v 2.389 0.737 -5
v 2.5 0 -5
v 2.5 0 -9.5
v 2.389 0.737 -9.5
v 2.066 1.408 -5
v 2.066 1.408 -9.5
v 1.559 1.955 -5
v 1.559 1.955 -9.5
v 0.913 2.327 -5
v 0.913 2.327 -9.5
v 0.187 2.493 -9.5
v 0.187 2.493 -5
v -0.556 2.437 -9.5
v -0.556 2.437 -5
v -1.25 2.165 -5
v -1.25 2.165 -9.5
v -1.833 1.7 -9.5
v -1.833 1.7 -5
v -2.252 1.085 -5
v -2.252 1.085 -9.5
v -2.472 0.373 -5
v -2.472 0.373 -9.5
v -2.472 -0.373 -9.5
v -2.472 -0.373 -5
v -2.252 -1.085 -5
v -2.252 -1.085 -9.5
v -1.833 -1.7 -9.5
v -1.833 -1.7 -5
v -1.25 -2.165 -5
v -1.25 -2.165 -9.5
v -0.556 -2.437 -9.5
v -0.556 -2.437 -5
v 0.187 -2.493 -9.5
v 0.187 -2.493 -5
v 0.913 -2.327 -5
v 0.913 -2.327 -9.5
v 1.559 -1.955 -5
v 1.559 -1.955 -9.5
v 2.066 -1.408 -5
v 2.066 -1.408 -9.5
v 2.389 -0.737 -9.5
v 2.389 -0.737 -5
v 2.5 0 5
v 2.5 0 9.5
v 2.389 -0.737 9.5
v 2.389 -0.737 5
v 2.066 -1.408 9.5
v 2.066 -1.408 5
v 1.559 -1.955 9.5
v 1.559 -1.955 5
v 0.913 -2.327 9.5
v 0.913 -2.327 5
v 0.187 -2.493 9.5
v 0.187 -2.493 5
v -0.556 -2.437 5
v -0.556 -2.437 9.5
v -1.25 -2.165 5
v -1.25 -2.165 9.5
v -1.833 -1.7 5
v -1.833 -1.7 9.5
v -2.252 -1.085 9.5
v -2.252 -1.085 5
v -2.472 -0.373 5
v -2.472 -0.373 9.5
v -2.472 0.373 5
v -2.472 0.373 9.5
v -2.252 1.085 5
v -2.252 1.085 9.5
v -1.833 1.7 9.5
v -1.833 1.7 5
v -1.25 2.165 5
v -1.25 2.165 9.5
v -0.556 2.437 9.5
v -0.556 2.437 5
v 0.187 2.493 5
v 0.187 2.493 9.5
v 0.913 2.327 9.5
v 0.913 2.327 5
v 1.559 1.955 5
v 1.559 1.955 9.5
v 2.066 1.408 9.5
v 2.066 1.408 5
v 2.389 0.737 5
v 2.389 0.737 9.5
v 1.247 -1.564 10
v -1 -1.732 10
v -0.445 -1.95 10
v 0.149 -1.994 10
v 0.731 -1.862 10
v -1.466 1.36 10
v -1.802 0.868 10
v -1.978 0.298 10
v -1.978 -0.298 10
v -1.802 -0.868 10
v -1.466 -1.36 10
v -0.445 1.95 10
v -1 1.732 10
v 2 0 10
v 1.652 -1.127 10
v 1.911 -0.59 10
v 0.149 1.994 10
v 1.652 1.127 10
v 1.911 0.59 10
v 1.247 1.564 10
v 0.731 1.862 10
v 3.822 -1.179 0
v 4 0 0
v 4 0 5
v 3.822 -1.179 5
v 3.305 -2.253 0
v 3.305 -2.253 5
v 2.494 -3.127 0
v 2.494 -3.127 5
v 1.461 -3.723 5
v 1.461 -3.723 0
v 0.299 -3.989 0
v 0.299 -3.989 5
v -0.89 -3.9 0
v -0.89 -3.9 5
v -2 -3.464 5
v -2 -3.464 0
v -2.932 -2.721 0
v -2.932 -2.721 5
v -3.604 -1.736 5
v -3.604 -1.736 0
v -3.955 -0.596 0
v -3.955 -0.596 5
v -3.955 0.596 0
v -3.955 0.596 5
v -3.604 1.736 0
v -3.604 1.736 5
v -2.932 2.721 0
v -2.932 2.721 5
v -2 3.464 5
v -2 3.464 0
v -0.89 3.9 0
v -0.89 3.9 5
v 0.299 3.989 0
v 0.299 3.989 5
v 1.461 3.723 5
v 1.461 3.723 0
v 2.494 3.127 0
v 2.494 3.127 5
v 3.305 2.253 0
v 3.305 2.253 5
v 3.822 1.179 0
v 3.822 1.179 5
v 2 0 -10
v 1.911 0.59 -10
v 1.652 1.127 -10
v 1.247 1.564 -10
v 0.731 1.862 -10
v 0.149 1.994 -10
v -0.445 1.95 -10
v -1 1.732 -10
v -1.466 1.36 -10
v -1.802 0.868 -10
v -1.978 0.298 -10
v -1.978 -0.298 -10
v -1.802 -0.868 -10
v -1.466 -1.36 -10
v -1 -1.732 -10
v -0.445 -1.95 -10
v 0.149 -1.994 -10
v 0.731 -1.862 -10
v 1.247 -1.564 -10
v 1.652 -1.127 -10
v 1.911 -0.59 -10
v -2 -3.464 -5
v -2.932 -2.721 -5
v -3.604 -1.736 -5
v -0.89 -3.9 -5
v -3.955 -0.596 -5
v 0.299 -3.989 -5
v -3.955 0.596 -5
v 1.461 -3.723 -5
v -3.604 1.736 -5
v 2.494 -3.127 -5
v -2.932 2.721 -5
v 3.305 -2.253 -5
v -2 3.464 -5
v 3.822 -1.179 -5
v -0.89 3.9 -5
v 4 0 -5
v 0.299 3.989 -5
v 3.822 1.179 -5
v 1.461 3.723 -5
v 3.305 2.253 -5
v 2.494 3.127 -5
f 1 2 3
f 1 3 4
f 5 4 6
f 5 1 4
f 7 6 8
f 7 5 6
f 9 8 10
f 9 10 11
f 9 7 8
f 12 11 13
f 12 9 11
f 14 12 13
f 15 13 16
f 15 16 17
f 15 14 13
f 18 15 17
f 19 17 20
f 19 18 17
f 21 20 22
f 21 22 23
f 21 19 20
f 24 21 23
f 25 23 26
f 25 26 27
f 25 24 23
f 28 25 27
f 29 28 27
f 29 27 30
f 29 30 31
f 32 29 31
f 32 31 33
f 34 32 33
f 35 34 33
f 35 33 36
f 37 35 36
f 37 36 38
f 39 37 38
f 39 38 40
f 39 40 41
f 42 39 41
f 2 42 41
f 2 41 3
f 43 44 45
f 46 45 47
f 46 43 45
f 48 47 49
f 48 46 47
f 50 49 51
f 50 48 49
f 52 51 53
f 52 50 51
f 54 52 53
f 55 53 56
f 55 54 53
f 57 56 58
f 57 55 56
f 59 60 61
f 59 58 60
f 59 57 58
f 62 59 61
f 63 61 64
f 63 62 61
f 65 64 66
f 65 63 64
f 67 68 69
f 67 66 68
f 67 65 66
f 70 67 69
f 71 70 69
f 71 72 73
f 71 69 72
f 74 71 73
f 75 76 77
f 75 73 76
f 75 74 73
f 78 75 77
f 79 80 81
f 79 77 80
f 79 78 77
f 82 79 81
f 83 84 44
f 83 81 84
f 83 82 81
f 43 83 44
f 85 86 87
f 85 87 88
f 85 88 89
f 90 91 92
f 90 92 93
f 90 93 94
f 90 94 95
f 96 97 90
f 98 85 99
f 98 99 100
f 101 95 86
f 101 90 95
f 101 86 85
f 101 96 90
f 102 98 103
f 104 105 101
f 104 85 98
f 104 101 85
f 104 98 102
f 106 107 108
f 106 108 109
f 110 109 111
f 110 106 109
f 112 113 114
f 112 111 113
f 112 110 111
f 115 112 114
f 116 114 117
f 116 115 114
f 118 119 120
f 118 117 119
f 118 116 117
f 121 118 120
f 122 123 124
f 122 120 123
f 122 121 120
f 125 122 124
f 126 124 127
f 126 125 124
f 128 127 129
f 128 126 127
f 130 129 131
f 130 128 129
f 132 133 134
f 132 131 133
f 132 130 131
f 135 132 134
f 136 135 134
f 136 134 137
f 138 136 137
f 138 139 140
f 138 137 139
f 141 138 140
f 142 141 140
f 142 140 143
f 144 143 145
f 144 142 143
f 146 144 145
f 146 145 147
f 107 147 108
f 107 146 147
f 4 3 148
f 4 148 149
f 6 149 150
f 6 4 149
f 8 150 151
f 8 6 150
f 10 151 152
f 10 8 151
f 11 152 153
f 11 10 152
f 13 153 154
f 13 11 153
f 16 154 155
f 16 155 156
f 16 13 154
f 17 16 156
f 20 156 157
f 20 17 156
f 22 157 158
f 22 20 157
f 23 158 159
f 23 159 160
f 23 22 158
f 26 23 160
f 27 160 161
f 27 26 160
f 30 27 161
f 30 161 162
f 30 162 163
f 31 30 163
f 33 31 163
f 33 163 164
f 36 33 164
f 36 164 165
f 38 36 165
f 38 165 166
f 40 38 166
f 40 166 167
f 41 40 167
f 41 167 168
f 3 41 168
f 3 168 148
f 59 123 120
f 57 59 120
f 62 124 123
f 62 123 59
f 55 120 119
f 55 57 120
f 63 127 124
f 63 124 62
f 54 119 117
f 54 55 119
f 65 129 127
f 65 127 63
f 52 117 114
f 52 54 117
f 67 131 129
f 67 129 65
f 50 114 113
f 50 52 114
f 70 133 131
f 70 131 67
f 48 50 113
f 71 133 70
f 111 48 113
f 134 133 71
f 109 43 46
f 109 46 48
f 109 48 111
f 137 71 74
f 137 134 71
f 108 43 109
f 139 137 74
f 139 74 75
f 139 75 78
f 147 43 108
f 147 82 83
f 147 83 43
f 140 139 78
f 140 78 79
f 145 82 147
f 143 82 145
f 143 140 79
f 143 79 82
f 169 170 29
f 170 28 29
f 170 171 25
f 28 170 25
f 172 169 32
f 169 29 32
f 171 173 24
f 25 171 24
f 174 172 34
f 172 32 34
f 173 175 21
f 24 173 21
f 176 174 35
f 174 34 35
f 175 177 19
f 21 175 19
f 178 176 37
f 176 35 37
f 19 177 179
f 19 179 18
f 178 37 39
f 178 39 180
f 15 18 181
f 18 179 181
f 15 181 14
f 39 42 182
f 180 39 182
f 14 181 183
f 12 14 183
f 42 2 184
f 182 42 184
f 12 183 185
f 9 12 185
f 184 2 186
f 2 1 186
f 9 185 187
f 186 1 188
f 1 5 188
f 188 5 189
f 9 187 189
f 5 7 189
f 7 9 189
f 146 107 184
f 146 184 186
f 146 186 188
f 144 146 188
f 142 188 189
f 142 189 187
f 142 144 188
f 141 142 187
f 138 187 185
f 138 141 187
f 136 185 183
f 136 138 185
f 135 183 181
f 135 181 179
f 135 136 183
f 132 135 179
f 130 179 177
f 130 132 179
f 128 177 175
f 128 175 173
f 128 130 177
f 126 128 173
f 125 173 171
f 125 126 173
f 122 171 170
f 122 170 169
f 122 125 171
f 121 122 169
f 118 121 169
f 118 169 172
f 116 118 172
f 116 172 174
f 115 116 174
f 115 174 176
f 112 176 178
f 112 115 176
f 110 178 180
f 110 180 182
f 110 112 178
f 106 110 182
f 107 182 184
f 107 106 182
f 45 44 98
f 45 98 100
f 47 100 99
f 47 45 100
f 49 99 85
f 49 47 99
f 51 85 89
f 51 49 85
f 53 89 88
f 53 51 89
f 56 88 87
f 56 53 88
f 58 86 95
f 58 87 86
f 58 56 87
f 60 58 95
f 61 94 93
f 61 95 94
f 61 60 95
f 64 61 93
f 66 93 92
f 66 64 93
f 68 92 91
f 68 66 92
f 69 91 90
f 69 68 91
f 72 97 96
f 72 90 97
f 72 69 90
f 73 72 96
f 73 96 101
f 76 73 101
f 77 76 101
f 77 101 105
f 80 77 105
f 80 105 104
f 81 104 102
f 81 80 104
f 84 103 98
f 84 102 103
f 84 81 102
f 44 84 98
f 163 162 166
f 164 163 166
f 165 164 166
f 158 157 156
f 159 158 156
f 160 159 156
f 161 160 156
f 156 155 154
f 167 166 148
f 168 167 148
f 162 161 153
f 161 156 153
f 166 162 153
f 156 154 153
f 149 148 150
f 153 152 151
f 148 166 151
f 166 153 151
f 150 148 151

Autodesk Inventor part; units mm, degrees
ref_plane "YZ Plane" through (0, 0, 0) normal (1, 0, 0) x (0, 1, 0)
ref_plane "XZ Plane" through (0, 0, 0) normal (0, 1, 0) x (-1, 0, 0)
ref_plane "XY Plane" through (0, 0, 0) normal (0, 0, 1) x (1, 0, 0)
sketch "Sketch1" plane through (0, 0, 0) normal (0, 0, 1) x (1, 0, 0)
  circle A0 centre (0, 0) radius 2.5
  dimension "d0" = 5
extrude "Extrusion1" add sketch "Sketch1" along normal mid plane 20
chamfer "Chamfer1" distance 0.5 angle 45 2 edges at (-2.5, 0, 10) (-2.5, 0, -10)
sketch "Sketch2" plane through (0, 0, 0) normal (0, 0, 1) x (1, 0, 0)
  circle A0 centre (0, 0) radius 2 projected
  circle A1 centre (0, 0) radius 4
  dimension "d6" = 8
extrude "Extrusion2" add sketch "Sketch2" along normal mid plane 10
properties part number "Lock pin"
